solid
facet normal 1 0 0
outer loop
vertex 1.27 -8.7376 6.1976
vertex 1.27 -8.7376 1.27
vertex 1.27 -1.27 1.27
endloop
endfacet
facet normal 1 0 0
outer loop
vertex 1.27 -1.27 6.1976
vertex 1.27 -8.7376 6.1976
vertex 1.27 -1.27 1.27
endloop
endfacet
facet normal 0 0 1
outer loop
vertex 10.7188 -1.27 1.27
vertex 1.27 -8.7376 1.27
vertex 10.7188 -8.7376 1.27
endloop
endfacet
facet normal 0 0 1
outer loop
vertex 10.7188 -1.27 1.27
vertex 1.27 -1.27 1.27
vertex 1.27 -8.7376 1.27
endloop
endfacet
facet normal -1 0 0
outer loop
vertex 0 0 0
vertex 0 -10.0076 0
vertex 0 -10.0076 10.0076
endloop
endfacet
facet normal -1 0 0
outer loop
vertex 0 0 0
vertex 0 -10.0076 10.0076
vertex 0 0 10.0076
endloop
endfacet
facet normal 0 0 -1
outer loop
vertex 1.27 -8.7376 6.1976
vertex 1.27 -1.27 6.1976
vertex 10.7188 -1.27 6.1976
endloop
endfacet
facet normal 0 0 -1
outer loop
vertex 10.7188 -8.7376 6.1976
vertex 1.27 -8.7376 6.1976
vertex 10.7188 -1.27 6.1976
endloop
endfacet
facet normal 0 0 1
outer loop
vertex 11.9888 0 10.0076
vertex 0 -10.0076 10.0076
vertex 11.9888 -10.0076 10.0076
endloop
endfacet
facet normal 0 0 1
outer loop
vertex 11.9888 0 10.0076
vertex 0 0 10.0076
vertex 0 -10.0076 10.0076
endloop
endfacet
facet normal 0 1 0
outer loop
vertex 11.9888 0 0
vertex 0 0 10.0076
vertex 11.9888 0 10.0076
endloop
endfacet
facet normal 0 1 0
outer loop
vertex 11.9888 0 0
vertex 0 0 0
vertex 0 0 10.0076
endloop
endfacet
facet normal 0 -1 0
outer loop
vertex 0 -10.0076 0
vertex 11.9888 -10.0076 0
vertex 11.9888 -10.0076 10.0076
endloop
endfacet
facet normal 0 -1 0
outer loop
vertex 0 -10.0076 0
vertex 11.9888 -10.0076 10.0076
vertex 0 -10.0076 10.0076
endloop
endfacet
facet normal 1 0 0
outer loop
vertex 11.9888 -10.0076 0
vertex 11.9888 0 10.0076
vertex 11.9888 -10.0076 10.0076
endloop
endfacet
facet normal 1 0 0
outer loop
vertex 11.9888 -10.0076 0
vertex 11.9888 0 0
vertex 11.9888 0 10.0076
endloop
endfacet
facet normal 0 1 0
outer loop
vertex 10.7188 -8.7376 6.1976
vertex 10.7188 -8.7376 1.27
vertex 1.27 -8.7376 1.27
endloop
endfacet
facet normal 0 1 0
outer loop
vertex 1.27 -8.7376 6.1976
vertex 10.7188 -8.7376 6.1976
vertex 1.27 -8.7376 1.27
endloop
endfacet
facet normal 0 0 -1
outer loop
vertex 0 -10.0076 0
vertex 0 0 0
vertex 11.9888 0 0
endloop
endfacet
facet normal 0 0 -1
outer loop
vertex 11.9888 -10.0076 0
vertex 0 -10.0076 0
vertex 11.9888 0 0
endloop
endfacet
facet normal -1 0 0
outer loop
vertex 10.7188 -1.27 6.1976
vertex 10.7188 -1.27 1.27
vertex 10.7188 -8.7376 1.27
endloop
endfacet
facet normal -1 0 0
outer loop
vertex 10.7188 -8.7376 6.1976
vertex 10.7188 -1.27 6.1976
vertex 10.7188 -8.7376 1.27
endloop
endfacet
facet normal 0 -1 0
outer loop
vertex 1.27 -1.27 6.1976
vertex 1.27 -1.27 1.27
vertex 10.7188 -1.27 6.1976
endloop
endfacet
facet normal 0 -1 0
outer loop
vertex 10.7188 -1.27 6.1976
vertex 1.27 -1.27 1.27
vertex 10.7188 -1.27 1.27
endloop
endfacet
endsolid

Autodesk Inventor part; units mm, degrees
ref_plane "YZ Plane" through (0, 0, 0) normal (1, 0, 0) x (0, 1, 0)
ref_plane "XZ Plane" through (0, 0, 0) normal (0, 1, 0) x (-1, 0, 0)
ref_plane "XY Plane" through (0, 0, 0) normal (0, 0, 1) x (1, 0, 0)
sketch "Sketch1" plane through (0, 0, 0) normal (0, 0, 1) x (1, 0, 0)
  line L0 (0, 0) -> (11.9888, 0)
  line L1 (11.9888, 0) -> (11.9888, -10.0076)
  line L2 (11.9888, -10.0076) -> (0, -10.0076)
  line L3 (0, -10.0076) -> (0, 0)
  dimension "d0" = 10.0076
  dimension "d1" = 11.9888
extrude "Extrusion1" add sketch "Sketch1" along normal blind 10.0076
shell "Shell1" thickness 1.27 removed faces 1 at (3.9963, -6.6717, 10.0076)
sketch "Sketch2" plane through (0, 0, 10.0076) normal (0, 0, 1) x (1, 0, 0)
  line L0 (1.27, -1.27) -> (10.7188, -1.27) projected
  line L1 (10.7188, -1.27) -> (10.7188, -8.7376) projected
  line L2 (10.7188, -8.7376) -> (1.27, -8.7376) projected
  line L3 (1.27, -8.7376) -> (1.27, -1.27) projected
extrude "Extrusion2" add sketch "Sketch2" against normal blind 3.81
properties part number "Gearmotor_Gear" material "Brass, Soft Yellow"
